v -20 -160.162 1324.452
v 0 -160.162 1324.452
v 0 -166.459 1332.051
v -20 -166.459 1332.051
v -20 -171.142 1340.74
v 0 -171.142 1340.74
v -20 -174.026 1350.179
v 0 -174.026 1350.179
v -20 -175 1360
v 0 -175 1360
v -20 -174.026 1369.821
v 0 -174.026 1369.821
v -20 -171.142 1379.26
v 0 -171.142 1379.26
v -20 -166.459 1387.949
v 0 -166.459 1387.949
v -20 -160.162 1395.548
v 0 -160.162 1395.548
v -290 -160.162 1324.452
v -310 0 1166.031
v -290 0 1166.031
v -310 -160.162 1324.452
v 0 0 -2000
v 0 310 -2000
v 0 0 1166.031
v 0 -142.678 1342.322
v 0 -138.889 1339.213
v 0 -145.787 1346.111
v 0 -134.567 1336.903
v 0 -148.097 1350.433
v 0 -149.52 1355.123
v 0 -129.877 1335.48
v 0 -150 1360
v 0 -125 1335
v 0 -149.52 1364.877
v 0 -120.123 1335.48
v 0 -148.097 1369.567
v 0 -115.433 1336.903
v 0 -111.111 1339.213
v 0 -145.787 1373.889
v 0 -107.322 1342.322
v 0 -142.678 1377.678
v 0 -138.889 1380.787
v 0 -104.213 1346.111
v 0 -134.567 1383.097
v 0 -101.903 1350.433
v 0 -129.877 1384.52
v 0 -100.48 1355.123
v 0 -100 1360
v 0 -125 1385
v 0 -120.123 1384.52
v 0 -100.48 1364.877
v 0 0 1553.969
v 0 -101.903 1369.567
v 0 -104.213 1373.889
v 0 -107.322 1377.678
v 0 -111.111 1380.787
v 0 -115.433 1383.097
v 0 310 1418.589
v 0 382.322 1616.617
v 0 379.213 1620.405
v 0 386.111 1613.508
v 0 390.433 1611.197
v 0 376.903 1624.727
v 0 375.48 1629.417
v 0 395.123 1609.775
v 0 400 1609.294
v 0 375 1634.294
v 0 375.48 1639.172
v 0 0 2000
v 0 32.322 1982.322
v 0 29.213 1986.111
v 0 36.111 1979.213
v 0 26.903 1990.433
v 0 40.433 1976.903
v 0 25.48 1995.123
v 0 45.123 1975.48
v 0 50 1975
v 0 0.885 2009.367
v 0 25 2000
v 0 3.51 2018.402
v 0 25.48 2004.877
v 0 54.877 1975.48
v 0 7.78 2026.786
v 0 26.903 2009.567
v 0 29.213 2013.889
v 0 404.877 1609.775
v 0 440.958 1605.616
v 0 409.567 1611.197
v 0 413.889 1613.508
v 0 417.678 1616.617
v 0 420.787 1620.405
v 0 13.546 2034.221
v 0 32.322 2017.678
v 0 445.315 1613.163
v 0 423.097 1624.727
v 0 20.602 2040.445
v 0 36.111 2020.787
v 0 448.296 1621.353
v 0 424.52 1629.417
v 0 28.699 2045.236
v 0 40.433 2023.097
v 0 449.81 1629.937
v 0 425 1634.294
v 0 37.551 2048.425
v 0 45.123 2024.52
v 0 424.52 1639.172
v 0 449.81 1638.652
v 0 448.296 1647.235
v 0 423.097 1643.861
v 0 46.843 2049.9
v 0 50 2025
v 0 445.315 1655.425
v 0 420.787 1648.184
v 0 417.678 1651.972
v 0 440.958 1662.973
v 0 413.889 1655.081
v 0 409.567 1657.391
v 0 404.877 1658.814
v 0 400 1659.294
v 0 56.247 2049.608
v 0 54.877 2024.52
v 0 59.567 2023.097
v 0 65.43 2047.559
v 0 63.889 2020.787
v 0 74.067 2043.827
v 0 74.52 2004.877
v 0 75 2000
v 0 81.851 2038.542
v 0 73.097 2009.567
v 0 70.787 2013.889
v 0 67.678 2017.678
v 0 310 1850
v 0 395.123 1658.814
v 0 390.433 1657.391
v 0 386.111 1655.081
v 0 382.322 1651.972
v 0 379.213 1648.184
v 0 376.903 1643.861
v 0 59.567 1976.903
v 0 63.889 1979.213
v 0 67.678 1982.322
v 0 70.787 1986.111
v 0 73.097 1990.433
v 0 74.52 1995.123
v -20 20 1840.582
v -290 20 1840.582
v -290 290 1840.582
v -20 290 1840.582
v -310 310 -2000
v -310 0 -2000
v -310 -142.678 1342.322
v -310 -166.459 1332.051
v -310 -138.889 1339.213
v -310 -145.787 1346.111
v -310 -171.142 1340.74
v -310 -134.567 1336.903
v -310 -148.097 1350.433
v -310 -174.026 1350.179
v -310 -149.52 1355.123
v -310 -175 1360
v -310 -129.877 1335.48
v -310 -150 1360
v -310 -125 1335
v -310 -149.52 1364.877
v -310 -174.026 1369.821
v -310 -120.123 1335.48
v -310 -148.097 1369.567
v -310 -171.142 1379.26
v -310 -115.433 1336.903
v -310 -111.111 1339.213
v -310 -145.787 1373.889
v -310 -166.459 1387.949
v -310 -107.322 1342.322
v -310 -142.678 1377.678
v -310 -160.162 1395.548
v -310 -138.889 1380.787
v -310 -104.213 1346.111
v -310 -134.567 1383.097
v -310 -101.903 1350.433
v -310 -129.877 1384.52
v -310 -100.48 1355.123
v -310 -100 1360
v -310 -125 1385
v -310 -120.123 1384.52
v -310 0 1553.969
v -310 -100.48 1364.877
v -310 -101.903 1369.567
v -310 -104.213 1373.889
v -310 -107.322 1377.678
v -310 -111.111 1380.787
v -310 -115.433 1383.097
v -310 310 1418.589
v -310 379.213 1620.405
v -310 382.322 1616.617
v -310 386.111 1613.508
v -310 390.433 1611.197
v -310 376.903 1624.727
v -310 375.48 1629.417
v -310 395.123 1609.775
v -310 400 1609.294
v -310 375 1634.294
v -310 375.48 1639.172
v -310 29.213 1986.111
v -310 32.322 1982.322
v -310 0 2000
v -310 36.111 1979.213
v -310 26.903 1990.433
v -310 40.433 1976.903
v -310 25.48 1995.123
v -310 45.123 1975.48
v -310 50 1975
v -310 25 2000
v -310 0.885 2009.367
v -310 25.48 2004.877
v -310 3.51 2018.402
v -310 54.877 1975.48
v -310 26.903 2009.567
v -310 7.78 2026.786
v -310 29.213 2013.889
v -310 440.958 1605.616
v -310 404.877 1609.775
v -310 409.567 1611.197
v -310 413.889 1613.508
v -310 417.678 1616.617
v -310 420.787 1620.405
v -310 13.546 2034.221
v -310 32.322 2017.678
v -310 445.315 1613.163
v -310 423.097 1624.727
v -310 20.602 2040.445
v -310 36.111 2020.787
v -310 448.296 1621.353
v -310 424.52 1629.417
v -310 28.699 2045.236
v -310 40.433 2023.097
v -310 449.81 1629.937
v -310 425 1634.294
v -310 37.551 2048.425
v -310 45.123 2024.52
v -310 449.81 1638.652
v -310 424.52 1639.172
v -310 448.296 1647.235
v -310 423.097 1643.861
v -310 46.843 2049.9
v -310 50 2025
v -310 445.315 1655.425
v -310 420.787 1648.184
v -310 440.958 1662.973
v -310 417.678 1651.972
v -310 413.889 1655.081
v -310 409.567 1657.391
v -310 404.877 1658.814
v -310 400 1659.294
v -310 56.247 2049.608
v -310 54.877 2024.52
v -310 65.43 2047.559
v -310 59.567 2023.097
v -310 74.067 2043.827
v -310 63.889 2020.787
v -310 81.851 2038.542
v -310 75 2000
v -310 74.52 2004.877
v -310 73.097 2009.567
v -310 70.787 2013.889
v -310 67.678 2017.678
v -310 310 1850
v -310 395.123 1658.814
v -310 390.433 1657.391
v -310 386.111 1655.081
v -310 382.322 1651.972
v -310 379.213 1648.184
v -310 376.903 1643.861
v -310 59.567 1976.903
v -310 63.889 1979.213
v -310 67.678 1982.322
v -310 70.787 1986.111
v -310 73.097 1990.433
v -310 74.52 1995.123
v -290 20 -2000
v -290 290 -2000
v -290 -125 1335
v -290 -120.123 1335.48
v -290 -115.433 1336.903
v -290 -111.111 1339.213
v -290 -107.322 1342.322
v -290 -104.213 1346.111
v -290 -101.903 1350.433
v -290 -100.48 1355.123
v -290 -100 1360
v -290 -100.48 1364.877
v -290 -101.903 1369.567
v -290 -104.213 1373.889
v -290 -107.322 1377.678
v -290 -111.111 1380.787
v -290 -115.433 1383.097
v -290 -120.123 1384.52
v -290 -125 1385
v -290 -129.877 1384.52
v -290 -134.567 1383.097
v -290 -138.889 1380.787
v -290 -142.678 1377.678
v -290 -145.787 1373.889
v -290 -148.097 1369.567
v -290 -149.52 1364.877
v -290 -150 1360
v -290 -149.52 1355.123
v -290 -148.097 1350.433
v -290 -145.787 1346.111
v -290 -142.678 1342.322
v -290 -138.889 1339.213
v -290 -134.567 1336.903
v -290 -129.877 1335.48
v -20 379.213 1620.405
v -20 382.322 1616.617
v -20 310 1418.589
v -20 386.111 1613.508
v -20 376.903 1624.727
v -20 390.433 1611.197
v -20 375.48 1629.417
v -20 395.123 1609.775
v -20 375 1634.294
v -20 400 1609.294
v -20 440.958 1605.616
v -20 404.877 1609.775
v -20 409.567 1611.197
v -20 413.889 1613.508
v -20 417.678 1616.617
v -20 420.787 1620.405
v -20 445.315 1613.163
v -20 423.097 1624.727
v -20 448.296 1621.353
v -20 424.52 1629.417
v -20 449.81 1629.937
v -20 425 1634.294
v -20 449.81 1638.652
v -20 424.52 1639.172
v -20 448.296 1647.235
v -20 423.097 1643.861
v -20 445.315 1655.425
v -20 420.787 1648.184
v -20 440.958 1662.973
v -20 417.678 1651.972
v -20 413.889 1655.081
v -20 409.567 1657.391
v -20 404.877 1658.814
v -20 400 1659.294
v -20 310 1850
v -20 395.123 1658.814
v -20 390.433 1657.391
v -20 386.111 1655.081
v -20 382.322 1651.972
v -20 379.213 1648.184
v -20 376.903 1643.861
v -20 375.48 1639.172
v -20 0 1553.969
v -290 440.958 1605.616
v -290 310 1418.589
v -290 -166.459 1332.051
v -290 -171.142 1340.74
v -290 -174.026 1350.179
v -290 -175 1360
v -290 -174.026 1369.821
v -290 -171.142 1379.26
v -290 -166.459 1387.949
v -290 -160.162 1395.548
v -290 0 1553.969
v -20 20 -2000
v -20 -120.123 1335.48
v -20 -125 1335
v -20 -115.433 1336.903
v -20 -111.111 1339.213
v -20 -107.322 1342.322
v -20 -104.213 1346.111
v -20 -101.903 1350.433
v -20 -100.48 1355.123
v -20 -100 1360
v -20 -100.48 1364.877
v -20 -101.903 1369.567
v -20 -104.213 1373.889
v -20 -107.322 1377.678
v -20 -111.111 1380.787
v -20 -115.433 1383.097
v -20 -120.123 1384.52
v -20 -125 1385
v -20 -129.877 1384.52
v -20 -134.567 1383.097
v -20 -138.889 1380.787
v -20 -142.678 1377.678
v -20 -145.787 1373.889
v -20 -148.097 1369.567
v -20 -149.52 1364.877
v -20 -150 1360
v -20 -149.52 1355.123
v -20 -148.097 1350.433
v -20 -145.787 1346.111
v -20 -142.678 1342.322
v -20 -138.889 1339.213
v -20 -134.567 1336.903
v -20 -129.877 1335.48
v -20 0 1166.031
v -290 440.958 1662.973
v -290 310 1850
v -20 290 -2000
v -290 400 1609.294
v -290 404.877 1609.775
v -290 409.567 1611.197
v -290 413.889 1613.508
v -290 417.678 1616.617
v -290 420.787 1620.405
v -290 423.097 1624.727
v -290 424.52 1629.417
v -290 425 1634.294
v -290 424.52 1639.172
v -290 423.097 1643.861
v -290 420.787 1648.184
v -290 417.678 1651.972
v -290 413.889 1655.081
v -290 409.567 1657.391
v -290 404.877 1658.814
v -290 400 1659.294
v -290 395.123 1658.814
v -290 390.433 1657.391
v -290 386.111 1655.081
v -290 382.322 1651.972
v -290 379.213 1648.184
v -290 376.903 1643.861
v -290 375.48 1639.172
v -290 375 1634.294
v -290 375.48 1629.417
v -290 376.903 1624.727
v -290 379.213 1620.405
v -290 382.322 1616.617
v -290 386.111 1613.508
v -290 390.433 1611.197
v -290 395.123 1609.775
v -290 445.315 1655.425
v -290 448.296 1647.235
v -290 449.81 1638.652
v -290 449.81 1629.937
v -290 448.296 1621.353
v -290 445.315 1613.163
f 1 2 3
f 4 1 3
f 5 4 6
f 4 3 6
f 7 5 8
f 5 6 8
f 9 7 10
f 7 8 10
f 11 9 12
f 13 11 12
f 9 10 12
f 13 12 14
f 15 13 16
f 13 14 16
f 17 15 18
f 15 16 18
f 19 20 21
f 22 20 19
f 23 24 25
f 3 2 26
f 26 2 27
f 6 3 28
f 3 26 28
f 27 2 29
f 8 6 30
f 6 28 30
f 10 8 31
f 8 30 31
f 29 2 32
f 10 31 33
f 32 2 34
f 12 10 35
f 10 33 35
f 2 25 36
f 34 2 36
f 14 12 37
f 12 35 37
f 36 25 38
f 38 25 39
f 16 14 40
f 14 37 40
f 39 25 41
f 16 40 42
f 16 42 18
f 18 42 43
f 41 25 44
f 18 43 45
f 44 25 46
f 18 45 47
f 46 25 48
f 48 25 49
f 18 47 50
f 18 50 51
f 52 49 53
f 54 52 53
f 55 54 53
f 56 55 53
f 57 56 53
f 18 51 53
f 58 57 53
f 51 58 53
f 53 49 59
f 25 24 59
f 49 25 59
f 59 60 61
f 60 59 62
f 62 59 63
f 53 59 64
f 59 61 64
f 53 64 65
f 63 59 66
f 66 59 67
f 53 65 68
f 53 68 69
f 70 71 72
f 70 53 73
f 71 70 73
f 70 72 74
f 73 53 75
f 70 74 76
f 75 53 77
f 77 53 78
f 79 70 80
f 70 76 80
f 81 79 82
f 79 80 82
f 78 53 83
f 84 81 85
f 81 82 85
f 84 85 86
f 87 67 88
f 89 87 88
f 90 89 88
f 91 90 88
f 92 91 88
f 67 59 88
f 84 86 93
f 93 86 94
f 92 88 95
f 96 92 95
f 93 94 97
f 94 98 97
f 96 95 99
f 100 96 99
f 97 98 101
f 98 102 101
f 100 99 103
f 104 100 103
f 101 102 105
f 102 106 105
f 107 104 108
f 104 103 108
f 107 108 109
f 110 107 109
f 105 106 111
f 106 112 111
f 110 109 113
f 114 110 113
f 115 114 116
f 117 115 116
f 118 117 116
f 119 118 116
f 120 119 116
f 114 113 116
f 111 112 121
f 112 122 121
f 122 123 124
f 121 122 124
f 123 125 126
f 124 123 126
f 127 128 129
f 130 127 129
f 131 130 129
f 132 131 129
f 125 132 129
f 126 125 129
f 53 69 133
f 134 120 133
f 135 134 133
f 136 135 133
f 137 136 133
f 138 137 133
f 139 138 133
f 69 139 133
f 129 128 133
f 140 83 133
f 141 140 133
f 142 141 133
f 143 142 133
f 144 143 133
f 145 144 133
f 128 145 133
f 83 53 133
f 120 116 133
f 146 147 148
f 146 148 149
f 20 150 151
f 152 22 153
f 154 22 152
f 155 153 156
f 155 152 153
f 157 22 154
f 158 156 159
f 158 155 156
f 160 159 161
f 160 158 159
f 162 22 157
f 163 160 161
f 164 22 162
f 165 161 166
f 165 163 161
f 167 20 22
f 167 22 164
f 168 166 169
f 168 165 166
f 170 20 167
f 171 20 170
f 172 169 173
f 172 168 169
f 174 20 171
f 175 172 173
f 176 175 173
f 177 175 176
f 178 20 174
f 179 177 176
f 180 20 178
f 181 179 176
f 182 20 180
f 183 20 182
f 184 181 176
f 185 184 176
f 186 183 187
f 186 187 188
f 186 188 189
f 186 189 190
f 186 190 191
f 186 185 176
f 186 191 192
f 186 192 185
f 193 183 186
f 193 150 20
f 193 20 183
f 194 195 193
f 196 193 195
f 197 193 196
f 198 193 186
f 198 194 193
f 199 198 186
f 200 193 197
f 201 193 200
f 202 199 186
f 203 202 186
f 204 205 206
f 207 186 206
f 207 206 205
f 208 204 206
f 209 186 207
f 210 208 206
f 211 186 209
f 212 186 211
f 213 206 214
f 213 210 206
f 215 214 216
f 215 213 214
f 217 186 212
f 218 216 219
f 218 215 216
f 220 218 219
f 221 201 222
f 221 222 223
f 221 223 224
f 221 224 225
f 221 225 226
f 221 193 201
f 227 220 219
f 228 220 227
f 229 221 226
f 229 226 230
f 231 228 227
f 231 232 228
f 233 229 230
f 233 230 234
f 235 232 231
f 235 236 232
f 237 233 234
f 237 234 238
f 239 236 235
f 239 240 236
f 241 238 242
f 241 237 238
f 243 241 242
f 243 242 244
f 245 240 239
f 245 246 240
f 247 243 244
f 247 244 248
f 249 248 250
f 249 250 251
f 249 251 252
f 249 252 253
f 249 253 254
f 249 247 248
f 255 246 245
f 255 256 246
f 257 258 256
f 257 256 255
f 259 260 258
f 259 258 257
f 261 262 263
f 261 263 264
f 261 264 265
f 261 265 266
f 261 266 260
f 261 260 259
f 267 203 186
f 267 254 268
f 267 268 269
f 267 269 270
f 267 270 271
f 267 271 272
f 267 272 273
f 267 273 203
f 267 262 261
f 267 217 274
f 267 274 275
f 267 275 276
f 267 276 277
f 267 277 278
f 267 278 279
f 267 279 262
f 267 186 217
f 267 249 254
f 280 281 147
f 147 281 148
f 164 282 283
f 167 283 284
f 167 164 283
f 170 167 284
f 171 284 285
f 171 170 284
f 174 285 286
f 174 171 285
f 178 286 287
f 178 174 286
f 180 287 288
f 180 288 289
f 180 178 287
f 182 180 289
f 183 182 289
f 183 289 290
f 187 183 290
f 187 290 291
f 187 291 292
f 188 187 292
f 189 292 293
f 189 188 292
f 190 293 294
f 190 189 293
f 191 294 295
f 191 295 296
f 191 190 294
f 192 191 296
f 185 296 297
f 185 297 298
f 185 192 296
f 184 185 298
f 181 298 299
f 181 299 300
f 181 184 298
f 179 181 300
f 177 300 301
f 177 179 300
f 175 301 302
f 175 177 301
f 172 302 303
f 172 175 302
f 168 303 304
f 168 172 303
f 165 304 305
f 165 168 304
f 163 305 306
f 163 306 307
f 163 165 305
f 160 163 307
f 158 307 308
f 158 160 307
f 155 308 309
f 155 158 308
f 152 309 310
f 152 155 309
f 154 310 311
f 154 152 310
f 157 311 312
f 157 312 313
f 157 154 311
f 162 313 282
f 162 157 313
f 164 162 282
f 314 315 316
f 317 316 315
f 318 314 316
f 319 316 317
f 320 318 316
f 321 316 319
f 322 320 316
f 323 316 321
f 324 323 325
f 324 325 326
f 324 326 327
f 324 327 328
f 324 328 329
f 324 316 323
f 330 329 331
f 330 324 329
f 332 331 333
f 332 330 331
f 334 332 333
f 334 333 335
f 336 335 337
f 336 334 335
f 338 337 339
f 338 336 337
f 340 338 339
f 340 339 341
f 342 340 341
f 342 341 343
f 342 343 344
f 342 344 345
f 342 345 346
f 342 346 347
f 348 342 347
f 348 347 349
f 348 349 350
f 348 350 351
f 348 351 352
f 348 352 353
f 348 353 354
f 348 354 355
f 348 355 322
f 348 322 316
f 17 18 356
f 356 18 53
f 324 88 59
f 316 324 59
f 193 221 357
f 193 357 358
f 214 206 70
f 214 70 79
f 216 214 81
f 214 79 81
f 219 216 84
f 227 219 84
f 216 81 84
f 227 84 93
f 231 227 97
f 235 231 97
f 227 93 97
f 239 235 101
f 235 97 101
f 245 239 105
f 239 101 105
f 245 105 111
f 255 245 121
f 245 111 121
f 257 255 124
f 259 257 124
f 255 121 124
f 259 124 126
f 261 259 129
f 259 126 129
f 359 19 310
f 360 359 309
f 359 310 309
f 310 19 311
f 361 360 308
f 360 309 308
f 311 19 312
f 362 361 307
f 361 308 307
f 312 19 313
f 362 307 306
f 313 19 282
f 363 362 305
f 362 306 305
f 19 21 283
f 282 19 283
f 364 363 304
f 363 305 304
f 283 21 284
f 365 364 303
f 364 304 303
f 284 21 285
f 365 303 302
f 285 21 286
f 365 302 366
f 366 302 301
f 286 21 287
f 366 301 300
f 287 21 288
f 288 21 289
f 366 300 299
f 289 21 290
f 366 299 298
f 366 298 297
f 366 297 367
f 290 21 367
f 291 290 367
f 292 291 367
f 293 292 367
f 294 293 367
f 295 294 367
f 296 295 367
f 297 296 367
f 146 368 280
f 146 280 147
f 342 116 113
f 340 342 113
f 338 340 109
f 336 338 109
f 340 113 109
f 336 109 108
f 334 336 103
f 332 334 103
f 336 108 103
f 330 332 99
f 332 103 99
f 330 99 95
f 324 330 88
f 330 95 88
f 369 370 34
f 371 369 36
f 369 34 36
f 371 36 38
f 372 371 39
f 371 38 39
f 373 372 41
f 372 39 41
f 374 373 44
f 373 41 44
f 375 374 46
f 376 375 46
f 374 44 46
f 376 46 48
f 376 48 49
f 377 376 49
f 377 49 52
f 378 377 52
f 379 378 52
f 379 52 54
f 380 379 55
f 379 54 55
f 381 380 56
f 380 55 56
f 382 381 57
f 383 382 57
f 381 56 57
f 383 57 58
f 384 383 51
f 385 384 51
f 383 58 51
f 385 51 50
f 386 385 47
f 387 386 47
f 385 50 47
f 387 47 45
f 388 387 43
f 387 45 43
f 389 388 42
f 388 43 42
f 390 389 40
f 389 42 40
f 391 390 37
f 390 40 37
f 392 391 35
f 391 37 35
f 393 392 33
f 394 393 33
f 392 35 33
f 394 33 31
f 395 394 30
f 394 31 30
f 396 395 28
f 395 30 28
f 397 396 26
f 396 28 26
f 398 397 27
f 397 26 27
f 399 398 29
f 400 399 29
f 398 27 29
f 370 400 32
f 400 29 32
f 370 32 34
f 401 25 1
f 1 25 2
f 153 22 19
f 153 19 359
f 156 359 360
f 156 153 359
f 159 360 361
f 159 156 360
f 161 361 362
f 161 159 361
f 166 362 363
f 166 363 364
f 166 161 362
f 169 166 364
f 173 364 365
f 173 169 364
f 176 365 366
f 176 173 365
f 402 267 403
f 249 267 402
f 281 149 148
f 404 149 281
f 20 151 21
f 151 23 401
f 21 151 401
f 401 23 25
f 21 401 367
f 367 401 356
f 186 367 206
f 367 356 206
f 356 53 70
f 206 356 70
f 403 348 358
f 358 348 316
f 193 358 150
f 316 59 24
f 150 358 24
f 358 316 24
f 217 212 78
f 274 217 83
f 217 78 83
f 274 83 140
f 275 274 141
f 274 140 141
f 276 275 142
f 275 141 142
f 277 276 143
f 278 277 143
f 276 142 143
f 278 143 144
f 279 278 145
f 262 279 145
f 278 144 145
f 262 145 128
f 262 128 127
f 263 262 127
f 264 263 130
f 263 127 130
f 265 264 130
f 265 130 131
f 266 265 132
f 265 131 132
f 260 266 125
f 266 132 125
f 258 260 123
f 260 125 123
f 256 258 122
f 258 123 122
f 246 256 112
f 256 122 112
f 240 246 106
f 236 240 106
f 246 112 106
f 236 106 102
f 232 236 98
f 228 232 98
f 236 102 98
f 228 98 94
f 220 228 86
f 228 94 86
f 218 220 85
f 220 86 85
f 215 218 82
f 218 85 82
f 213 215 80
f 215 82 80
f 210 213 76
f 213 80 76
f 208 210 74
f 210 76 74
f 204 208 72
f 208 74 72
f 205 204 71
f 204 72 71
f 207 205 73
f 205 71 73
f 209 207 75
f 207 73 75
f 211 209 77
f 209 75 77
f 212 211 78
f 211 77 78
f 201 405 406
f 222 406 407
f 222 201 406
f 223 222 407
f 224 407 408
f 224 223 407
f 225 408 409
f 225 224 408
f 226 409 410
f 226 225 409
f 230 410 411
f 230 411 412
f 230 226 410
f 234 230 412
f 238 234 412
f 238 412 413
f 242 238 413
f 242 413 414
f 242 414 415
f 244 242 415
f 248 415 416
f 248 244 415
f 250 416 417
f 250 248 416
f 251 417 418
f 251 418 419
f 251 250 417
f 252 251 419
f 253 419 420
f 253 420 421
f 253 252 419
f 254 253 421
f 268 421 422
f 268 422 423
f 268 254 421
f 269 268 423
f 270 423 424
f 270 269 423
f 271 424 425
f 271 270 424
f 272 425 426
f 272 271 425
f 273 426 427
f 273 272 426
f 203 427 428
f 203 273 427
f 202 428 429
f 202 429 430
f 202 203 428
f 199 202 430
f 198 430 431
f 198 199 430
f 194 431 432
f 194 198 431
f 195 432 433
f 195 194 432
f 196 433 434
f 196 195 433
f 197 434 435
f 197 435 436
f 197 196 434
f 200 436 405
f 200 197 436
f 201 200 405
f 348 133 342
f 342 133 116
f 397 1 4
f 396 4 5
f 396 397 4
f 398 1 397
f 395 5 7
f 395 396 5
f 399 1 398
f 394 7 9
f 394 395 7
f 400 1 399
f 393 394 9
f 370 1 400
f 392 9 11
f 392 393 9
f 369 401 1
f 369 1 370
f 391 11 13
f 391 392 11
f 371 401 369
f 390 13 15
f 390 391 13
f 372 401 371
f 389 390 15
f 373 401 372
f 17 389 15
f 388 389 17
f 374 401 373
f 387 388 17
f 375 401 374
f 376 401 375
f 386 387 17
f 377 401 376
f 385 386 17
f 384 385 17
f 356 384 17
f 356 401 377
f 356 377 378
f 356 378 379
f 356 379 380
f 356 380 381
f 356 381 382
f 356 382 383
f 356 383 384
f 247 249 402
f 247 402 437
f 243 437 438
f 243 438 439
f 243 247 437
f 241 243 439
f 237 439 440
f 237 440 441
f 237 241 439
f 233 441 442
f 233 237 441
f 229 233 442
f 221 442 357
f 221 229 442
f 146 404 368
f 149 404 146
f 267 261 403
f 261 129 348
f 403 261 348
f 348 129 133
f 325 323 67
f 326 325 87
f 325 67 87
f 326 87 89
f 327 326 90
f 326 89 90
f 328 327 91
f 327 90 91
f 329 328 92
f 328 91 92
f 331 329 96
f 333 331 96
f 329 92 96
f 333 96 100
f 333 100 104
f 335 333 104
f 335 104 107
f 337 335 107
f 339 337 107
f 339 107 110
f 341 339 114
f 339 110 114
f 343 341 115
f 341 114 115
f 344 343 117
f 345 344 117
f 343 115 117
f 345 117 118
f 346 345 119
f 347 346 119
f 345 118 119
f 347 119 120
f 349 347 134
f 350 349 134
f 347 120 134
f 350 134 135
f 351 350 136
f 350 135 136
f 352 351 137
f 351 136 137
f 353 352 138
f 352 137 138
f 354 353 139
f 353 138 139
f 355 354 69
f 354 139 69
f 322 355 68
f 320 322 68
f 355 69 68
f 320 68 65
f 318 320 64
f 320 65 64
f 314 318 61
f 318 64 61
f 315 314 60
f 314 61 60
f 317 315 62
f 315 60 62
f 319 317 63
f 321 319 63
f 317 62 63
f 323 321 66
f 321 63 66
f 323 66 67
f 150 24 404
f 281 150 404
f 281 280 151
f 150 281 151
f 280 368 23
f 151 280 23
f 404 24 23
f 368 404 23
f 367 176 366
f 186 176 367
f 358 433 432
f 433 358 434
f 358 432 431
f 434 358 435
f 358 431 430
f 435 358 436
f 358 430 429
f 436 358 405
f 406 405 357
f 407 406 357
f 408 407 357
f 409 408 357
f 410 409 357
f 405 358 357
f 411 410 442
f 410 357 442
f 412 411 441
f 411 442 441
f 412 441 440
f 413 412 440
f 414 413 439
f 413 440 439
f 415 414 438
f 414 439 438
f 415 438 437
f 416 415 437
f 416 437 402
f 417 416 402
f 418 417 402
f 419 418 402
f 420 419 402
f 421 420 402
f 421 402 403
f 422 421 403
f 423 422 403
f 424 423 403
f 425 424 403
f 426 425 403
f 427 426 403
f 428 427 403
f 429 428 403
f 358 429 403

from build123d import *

# Parameters (mm, degrees)
SKETCH1_R           = 25
BOSS_EXTRUDE1_DEPTH = 310
SHELL1_T            = -20
BOSS_EXTRUDE3_REACH = 3867.524
SKETCH2_W           = 270
SKETCH2_H           = 270
SKETCH3_R           = 25
BOSS_EXTRUDE4_DEPTH = 20


with BuildPart() as part:
    # Sketch1 → Boss-Extrude1 (new body)
    with BuildSketch(Plane(origin=(0, 0, 0), x_dir=(0, 0, -1), z_dir=(1, 0, 0))):
        with BuildLine():
            Line((2000, 310), (2000, 0))
            Line((2000, 0), (-2000, 0))
            ThreePointArc((-2000, 0), (-2045.235839293, 28.699322933), (-2038.542160184, 81.85124626))
            Line((-2038.542160184, 81.85124626), (-1850, 310))
            Line((-1850, 310), (2000, 310))
        make_face()
        with Locations((-2000, 50)):
            Circle(SKETCH1_R, mode=Mode.SUBTRACT)
    extrude(amount=-BOSS_EXTRUDE1_DEPTH)

    # Shell1
    shell1_openings = [part.faces().sort_by_distance(p)[0] for p in [
        (-155, 155, -2000),
    ]]
    offset(amount=SHELL1_T, openings=shell1_openings, kind=Kind.INTERSECTION)

    # Sketch2 → Boss-Extrude3 (add, up to next)
    with BuildSketch(Plane(origin=(0, 0, 1840.58238892), x_dir=(1, 0, 0), z_dir=(0, 0, -1)), mode=Mode.PRIVATE) as boss_extrude3_sk1:
        with Locations((-155, -155)):
            Rectangle(SKETCH2_W, SKETCH2_H)
    boss_extrude3_tool1 = extrude(boss_extrude3_sk1.sketch, amount=-BOSS_EXTRUDE3_REACH, mode=Mode.PRIVATE) - part.part
    add(boss_extrude3_tool1.solids().sort_by_distance((-155, 155, 1840.582389))[0])

    # Sketch3 → Boss-Extrude4 (add)
    # profile 1 of 2: a face of its own
    with BuildSketch(Plane(origin=(0, 0, 0), x_dir=(0, 0, -1), z_dir=(1, 0, 0))):
        with BuildLine():
            Line((-1553.968883966, 0), (-1166.031116034, 0))
            Line((-1166.031116034, 0), (-1324.452009603, -160.161632196))
            ThreePointArc((-1324.452009603, -160.161632196), (-1360, -175), (-1395.547990397, -160.161632196))
            Line((-1395.547990397, -160.161632196), (-1553.968883966, 0))
        make_face()
        with Locations((-1360, -125)):
            Circle(SKETCH3_R, mode=Mode.SUBTRACT)
    # profile 2 of 2: a face of its own
    with BuildSketch(Plane(origin=(0, 0, 0), x_dir=(0, 0, -1), z_dir=(1, 0, 0))):
        with BuildLine():
            Line((-1850, 310), (-1662.97316143, 440.957602214))
            ThreePointArc((-1662.97316143, 440.957602214), (-1634.294339612, 450), (-1605.615517795, 440.957602214))
            Line((-1605.615517795, 440.957602214), (-1418.588679224, 310))
            Line((-1418.588679224, 310), (-1634.294339612, 310))
            Line((-1634.294339612, 310), (-1850, 310))
        make_face()
        with Locations((-1634.294339612, 400)):
            Circle(SKETCH3_R, mode=Mode.SUBTRACT)
    boss_extrude4 = extrude(amount=-BOSS_EXTRUDE4_DEPTH)

    # Mirror1: Boss-Extrude4 across plane
    add(boss_extrude4.mirror(Plane.ZY.offset(155)))


solid = part.part
